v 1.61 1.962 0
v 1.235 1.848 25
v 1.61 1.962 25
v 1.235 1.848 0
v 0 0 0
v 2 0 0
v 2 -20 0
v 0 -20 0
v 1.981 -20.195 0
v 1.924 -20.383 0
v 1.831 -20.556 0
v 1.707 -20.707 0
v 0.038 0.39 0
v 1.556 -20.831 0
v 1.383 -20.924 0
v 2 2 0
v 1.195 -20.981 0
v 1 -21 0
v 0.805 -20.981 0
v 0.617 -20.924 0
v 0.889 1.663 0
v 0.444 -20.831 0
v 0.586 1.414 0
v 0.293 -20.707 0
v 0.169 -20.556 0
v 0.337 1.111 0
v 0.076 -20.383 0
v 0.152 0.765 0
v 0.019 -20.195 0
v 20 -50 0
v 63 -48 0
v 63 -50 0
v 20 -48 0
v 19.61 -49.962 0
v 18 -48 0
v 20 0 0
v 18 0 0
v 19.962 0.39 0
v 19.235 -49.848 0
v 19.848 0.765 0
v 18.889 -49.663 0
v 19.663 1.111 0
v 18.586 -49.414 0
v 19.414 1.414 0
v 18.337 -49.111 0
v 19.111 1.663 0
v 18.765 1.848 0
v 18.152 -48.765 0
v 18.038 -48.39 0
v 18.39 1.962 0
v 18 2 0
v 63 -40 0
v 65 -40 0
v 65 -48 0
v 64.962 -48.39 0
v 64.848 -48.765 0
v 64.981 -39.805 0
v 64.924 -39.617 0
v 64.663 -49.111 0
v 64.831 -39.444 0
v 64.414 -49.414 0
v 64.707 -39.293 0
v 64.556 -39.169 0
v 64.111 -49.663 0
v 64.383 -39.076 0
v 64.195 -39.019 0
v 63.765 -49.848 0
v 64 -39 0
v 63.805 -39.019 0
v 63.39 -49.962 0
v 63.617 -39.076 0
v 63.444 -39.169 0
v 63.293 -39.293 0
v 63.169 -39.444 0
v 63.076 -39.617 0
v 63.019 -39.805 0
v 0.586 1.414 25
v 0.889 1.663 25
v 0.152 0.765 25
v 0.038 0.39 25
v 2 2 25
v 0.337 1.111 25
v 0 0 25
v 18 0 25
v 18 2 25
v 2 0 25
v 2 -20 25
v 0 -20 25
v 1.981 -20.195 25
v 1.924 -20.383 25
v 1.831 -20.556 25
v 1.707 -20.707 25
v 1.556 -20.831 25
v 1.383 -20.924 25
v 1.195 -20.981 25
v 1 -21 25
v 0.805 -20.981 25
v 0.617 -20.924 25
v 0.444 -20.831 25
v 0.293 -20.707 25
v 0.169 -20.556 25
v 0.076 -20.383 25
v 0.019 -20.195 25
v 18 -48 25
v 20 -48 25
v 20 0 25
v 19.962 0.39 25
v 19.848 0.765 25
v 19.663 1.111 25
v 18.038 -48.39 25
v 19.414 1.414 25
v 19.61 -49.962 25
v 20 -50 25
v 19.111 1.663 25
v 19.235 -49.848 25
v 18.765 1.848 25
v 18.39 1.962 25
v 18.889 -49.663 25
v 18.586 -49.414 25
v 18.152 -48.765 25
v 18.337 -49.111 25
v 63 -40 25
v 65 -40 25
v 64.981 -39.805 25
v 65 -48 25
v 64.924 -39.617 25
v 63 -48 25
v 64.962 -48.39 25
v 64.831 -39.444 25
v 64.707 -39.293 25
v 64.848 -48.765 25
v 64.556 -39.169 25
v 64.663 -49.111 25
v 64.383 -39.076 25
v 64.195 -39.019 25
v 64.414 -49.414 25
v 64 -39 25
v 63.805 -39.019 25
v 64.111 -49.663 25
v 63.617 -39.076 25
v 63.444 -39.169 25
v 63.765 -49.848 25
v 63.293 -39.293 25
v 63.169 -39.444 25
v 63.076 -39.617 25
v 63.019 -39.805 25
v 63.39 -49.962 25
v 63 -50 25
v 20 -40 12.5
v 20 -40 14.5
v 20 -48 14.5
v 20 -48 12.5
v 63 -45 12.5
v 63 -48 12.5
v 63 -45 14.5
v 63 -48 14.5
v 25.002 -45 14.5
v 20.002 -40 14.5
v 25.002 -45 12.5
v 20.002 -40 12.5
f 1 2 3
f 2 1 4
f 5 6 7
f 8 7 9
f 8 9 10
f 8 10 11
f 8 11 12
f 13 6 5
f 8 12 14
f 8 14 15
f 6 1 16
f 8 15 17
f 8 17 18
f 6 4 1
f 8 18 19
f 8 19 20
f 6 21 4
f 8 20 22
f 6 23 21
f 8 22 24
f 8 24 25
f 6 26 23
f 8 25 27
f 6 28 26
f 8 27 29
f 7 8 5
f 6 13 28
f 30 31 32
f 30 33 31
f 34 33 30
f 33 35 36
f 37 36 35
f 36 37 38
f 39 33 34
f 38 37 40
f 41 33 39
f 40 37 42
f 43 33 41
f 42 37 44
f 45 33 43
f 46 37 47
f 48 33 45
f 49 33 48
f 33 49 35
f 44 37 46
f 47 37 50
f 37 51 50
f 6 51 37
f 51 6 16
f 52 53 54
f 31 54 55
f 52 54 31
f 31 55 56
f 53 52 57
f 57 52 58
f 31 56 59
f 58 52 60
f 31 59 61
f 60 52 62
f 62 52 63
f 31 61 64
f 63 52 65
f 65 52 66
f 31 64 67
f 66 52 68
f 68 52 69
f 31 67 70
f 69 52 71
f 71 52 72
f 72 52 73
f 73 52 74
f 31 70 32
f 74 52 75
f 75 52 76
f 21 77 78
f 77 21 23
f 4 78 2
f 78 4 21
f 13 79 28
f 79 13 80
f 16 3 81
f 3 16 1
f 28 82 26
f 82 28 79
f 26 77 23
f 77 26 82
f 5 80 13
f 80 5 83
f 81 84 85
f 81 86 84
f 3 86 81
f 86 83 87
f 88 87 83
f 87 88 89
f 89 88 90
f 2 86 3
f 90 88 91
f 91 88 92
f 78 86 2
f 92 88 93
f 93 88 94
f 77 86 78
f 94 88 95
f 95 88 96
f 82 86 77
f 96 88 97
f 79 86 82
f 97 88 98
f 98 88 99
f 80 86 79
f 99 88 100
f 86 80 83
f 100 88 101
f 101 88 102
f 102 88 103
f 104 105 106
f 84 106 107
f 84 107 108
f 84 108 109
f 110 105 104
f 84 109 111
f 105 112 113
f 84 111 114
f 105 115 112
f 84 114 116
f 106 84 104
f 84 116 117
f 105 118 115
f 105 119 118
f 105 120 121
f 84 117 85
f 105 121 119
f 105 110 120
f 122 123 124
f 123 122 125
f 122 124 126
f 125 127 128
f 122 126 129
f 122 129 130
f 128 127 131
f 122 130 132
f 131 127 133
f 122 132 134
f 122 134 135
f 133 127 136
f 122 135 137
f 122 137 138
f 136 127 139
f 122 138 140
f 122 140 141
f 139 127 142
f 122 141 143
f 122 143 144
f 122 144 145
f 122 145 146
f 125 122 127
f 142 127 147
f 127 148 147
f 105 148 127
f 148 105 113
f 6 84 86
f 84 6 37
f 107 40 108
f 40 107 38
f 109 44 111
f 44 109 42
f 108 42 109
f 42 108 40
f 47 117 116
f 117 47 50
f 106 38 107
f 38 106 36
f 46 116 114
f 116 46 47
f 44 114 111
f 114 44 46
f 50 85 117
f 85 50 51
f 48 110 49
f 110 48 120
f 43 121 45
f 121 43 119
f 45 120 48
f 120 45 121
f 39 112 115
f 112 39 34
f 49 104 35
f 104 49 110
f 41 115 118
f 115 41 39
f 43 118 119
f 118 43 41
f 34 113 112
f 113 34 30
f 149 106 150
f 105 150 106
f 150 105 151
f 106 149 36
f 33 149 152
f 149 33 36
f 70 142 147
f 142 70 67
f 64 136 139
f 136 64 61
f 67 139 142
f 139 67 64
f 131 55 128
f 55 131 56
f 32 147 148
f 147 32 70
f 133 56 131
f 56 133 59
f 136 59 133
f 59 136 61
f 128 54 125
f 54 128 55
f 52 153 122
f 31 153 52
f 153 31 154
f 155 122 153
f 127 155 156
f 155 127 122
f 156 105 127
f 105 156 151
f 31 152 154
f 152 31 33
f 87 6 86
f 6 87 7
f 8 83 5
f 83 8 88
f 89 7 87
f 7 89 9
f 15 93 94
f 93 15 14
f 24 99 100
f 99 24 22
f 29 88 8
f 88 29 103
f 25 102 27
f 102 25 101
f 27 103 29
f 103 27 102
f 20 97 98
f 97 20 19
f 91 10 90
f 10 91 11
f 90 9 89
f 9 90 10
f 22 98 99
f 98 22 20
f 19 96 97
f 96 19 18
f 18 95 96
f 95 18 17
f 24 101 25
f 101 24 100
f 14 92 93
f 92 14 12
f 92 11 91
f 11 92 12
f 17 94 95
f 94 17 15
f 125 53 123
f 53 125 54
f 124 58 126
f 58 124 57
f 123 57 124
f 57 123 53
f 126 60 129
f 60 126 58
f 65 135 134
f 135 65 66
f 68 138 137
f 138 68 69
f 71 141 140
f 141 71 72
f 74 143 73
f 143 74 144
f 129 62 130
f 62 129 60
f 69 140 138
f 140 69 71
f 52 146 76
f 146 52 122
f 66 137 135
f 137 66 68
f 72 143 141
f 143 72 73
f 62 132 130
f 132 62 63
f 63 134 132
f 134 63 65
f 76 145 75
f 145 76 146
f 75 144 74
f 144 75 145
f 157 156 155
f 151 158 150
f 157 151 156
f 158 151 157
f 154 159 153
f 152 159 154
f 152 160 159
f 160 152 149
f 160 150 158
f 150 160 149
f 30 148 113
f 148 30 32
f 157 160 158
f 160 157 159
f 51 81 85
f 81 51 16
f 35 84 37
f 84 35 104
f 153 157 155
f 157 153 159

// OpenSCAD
/*
The MIT License (MIT)

Copyright (c) 2020 Shinichi Ohki.

Permission is hereby granted, free of charge, to any person obtaining a copy
of this software and associated documentation files (the "Software"), to deal
in the Software without restriction, including without limitation the rights
to use, copy, modify, merge, publish, distribute, sublicense, and/or sell
copies of the Software, and to permit persons to whom the Software is
furnished to do so, subject to the following conditions:

The above copyright notice and this permission notice shall be included in
all copies or substantial portions of the Software.

THE SOFTWARE IS PROVIDED "AS IS", WITHOUT WARRANTY OF ANY KIND, EXPRESS OR
IMPLIED, INCLUDING BUT NOT LIMITED TO THE WARRANTIES OF MERCHANTABILITY,
FITNESS FOR A PARTICULAR PURPOSE AND NONINFRINGEMENT. IN NO EVENT SHALL THE
AUTHORS OR COPYRIGHT HOLDERS BE LIABLE FOR ANY CLAIM, DAMAGES OR OTHER
LIABILITY, WHETHER IN AN ACTION OF CONTRACT, TORT OR OTHERWISE, ARISING FROM,
OUT OF OR IN CONNECTION WITH THE SOFTWARE OR THE USE OR OTHER DEALINGS IN
THE SOFTWARE.
*/

w = 25;
$fn=32;

module kadomaru(w,dir) {
  rotate(dir*90) {
    intersection() {
      translate([2,0,0]) {
        cylinder(h=w,r=2);
      }
      cube([2,2,w]);
    }
  }
}

kadomaru(w,0);
translate([18,2,0]) {
  kadomaru(w,3);
}
translate([20,-50,0]) {
  kadomaru(w,1);
}
translate([65,-48,0]) {
  kadomaru(w,2);
}

translate([2,0,0]) {
  cube([16,2,w]);
}

translate([0,-20,0]) {
  cube([2,20,w]);
  translate([1,0,0]) {
    cylinder(h=w,r=1);
  }
}

translate([18,-48,0]) {
  cube([2,48,w]);
}

translate([20,-50,0]) {
  cube([43,2,w]);
}

translate([63,-48,0]) {
  cube([2,8,w]);
  translate([1,8,0]) {
    cylinder(h=w,r=1);
  }
}

translate([20,-50,w/2]) {
  difference() {
    cube([10,10,2]);
    translate([10,10,1]) {
      rotate([0,0,-45]) {
        cube([14.14,14.14,2],center=true);
      }
    }
  }
}

translate([20,-50,w/2]) {
  cube([43,5,2]);
}
